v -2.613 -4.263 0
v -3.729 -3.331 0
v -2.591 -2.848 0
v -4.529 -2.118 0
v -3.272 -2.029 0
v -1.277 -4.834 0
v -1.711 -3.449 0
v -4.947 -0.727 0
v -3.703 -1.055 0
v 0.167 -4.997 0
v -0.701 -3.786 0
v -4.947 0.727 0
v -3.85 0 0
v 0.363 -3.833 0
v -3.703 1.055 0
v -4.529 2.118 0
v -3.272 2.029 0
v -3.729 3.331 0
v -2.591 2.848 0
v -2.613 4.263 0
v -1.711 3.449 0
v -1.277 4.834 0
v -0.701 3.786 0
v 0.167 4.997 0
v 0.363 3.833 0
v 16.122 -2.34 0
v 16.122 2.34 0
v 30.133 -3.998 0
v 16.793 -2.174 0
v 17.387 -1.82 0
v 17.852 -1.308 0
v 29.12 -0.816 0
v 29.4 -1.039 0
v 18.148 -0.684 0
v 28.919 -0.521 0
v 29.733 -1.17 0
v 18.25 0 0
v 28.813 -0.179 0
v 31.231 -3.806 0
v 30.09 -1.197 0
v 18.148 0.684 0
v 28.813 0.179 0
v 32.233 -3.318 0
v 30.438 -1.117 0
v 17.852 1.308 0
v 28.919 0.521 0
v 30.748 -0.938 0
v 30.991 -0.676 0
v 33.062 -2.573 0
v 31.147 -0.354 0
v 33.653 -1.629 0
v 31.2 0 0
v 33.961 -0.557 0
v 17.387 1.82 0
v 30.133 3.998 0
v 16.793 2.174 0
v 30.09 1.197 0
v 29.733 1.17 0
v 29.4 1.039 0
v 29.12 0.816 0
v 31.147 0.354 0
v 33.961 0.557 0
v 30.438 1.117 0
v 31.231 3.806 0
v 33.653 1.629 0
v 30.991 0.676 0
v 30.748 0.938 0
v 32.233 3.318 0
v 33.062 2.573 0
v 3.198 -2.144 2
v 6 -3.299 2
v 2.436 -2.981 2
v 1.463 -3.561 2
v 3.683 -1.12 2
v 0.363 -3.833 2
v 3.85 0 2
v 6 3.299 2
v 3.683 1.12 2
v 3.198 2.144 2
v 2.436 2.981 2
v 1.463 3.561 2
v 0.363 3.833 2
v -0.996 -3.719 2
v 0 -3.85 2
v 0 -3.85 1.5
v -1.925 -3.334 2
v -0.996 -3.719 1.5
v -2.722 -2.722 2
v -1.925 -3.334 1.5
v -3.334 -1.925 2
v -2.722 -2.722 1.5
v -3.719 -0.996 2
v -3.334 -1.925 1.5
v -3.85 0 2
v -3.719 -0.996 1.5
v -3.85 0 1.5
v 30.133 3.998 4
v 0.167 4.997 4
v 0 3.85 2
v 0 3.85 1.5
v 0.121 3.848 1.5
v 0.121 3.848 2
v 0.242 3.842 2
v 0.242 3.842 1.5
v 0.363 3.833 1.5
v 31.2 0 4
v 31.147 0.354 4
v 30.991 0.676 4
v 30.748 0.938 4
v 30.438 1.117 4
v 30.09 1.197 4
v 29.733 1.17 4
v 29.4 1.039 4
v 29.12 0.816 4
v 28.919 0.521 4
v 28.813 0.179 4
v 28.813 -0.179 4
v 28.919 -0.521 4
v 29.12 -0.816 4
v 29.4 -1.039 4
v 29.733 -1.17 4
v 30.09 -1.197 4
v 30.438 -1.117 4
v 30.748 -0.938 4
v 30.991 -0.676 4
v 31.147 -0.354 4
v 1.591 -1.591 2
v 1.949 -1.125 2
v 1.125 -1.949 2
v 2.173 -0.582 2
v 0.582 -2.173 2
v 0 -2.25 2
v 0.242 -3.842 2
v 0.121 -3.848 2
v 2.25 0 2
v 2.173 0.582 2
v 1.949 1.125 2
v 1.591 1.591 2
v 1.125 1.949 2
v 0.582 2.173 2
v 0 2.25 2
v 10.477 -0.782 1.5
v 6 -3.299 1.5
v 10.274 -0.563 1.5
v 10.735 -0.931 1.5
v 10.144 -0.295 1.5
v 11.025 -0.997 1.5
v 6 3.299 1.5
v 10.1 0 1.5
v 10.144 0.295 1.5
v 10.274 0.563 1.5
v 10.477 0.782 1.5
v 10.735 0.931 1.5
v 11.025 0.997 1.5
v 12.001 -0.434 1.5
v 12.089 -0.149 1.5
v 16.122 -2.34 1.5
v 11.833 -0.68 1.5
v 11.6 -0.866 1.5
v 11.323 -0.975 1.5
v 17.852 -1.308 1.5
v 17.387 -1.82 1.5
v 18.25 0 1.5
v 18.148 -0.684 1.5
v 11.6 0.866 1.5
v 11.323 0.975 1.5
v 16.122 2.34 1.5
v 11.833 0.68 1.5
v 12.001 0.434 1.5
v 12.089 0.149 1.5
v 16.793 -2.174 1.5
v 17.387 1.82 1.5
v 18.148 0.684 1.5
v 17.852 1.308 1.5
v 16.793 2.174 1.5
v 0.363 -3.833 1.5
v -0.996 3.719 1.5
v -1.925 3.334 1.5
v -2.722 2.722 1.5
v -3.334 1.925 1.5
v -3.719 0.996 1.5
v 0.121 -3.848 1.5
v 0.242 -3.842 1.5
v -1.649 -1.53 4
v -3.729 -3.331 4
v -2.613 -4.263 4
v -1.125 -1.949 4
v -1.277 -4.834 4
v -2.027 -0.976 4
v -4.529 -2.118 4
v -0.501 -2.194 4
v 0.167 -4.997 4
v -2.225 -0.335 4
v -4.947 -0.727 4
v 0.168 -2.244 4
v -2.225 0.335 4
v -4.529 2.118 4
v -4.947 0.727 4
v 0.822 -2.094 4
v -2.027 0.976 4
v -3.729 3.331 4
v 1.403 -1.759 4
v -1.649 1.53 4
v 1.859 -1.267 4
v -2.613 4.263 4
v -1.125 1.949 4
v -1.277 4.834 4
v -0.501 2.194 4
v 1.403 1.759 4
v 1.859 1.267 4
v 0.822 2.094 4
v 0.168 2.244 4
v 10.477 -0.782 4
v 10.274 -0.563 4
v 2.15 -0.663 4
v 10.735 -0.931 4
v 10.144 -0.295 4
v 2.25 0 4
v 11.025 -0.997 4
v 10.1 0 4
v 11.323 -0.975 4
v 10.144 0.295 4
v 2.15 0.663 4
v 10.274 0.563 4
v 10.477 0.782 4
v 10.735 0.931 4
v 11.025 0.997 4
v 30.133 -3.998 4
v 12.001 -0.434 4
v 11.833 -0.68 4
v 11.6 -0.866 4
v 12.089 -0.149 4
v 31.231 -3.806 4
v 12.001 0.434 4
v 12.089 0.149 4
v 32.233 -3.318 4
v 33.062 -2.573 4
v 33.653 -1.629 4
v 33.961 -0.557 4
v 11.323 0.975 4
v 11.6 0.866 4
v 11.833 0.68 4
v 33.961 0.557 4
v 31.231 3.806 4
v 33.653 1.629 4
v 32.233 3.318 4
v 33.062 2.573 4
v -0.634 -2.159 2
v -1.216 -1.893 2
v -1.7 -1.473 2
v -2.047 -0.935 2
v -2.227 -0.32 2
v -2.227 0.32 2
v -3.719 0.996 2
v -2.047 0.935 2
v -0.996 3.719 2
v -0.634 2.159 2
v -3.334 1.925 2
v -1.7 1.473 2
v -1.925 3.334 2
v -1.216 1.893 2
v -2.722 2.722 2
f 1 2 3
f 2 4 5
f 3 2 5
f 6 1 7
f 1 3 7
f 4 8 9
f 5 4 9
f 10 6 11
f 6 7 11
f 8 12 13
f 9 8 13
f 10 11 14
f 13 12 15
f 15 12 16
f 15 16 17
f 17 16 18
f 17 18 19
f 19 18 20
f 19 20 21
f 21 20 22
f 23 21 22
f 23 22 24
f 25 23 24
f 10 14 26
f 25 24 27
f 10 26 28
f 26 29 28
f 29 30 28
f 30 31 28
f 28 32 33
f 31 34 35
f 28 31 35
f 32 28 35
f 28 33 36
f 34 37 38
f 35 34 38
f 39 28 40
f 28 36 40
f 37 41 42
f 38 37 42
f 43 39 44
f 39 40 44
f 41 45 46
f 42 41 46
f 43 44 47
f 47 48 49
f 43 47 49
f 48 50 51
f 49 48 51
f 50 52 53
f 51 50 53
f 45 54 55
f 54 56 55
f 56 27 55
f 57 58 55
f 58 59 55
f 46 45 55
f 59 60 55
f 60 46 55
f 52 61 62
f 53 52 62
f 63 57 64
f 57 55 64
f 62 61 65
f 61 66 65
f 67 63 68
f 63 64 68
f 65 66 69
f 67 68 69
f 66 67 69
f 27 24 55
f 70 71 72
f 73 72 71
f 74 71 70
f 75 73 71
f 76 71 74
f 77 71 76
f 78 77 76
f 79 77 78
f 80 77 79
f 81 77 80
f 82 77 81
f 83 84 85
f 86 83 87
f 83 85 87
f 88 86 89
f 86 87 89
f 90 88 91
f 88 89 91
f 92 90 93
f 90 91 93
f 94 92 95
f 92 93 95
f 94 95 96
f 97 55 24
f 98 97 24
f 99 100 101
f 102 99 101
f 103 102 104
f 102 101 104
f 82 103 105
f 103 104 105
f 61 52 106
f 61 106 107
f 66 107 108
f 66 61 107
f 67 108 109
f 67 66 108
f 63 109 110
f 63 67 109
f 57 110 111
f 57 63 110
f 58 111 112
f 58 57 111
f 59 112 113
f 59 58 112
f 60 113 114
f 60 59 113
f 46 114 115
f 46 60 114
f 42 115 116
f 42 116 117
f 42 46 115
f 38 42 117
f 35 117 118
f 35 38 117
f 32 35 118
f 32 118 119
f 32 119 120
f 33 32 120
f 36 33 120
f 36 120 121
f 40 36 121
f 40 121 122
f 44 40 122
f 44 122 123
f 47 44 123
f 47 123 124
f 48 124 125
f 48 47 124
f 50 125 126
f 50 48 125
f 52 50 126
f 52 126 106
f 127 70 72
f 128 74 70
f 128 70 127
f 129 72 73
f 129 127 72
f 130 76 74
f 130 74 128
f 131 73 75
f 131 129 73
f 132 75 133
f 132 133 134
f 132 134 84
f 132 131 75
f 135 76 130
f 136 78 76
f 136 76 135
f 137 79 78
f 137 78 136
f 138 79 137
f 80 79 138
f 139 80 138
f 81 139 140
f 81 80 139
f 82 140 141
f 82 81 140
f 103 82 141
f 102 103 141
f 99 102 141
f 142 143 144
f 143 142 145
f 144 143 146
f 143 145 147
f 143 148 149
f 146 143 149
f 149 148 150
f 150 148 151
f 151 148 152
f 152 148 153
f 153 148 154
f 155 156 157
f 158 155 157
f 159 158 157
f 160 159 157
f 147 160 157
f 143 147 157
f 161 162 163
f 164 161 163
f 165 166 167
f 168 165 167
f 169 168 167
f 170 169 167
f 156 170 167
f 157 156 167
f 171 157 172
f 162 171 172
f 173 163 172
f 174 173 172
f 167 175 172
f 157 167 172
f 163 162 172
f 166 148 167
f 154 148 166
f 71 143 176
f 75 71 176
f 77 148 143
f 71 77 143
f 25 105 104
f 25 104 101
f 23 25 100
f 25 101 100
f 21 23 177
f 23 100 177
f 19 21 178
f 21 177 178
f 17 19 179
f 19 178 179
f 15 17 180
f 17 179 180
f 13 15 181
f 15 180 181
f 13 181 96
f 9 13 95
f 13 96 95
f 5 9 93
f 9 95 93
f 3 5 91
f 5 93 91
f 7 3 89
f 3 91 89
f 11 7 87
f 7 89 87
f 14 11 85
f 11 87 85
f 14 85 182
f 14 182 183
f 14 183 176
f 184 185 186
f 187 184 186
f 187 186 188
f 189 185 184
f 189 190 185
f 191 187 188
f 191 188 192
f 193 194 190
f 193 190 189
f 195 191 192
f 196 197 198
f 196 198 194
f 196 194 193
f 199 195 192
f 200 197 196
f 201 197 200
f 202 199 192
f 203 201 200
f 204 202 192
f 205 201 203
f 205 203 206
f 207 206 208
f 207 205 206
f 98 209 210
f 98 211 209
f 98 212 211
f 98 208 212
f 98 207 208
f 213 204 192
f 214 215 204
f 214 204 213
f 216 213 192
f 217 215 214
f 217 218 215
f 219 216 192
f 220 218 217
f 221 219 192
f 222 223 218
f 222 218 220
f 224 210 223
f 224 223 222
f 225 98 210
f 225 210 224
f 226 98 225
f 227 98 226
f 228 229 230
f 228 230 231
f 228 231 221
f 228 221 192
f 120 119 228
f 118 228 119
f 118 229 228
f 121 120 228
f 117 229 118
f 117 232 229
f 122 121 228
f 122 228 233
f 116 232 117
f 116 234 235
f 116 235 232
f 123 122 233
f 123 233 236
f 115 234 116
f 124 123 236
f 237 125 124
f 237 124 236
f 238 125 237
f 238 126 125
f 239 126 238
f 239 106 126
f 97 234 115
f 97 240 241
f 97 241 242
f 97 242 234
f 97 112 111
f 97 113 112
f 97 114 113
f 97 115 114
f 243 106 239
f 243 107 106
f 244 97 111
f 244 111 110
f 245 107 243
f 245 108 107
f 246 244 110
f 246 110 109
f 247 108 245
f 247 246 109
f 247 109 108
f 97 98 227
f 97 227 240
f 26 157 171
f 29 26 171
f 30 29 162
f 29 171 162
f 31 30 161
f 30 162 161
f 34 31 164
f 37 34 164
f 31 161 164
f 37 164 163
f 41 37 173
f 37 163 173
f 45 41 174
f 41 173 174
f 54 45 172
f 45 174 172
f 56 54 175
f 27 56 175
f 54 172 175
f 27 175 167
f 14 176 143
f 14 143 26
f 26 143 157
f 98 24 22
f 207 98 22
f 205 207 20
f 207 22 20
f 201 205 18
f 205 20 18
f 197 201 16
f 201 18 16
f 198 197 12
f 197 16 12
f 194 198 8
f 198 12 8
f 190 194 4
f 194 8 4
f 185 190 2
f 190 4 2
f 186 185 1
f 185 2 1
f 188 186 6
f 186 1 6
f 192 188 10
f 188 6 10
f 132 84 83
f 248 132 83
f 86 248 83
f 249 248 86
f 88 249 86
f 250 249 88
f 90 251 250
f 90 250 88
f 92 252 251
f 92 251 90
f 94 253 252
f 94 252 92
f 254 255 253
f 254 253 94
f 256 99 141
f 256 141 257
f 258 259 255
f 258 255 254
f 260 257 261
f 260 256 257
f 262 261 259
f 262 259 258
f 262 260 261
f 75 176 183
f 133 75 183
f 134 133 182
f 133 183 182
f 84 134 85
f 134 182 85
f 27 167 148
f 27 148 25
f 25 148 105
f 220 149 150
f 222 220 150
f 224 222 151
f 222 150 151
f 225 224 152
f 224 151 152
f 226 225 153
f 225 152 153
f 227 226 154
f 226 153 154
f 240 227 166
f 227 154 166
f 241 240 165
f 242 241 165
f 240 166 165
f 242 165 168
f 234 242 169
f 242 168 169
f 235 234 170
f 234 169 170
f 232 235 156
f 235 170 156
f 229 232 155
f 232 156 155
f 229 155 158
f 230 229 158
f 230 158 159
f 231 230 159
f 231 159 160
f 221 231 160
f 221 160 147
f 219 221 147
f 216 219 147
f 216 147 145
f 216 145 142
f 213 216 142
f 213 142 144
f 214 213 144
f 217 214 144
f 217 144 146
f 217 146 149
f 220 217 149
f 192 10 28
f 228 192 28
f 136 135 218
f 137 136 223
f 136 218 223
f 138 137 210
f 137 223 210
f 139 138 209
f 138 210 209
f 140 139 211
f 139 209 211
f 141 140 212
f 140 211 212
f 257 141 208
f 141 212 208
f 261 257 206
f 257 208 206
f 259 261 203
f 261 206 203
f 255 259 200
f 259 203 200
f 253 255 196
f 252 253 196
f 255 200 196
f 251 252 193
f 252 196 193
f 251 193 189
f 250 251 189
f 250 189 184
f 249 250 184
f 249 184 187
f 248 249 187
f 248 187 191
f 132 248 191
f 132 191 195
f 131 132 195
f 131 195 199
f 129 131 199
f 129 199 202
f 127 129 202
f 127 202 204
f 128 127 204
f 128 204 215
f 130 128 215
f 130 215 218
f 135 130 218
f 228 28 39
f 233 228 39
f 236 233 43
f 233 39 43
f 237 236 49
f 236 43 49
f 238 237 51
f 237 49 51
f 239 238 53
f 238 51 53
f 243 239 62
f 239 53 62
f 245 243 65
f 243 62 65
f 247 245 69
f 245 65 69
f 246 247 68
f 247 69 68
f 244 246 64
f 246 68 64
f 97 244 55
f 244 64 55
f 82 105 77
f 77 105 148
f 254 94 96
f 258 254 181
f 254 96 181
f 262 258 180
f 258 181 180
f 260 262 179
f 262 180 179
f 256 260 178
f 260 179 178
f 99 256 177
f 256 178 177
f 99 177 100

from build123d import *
from build123d.topology import SkipClean

# Parameters (mm, degrees)
SKETCH14_R          = 4
SKETCH14_R_2        = 1.2
SKETCH14_R_3        = 5
BOSS_EXTRUDE1_DEPTH = 4
CUT_EXTRUDE1_START  = -2.5
SKETCH15_R          = 1.2
CUT_EXTRUDE1_DEPTH  = 1.5
CUT_EXTRUDE2_DEPTH  = 0.5
SKETCH17_R          = 1
CUT_EXTRUDE3_DEPTH  = 6
SKETCH18_R          = 2.25
CUT_EXTRUDE4_DEPTH  = 10


with BuildPart() as part:
    # Sketch14 → Boss-Extrude1 (new body)
    with BuildSketch(Plane.XY):
        with BuildLine():
            Line((30.133333333, 3.99777716), (0.166666667, 4.99722145))
            ThreePointArc((0.166666667, 4.99722145), (3.593976442, 3.476108936), (5, 0))
            ThreePointArc((5, 0), (3.593976442, -3.476108936), (0.166666667, -4.99722145))
            Line((0.166666667, -4.99722145), (30.133333333, -3.99777716))
            ThreePointArc((30.133333333, -3.99777716), (26, 0), (30.133333333, 3.99777716))
        make_face()
        with Locations((30, 0)):
            Circle(SKETCH14_R)
        with Locations((30, 0)):
            Circle(SKETCH14_R_2, mode=Mode.SUBTRACT)
        Circle(SKETCH14_R_3)
        Circle(SKETCH14_R_2, mode=Mode.SUBTRACT)
    extrude(amount=BOSS_EXTRUDE1_DEPTH)

    # Sketch15 → Cut-Extrude1 (cut)
    with BuildSketch(Plane.XY.offset(4).offset(CUT_EXTRUDE1_START)):
        with BuildLine():
            Line((16.121698113, 2.33951917), (0.363207547, 3.832829278))
            ThreePointArc((0.363207547, 3.832829278), (-3.85, 0), (0.363207547, -3.832829278))
            Line((0.363207547, -3.832829278), (16.121698113, -2.33951917))
            ThreePointArc((16.121698113, -2.33951917), (18.25, 0), (16.121698113, 2.33951917))
        make_face()
        Circle(SKETCH15_R, mode=Mode.SUBTRACT)
    extrude(amount=-CUT_EXTRUDE1_DEPTH, mode=Mode.SUBTRACT)

    # Sketch16 → Cut-Extrude2 (cut)
    with SkipClean():  # the faces are left unmerged after this step: merging them gives an invalid solid
        with BuildSketch(Plane(origin=(0, 0, 1.5), x_dir=(-1, 0, 0), z_dir=(0, 0, -1))):
            with BuildLine():
                ThreePointArc((-0.363207547, -3.832829278), (-3.85, 0), (-0.363207547, 3.832829278))
                Line((-0.363207547, 3.832829278), (-6, 3.298674112))
                Line((-6, 3.298674112), (-6, -3.298674112))
                Line((-6, -3.298674112), (-0.363207547, -3.832829278))
            make_face()
            with BuildLine():
                ThreePointArc((3.85, 0), (2.722361108, 2.722361108), (0, 3.85))
                Line((0, 3.85), (0, 1.2))
                ThreePointArc((0, 1.2), (0.848528137, 0.848528137), (1.2, 0))
                ThreePointArc((1.2, 0), (0.848528137, -0.848528137), (0, -1.2))
                Line((0, -1.2), (0, -3.85))
                ThreePointArc((0, -3.85), (2.722361108, -2.722361108), (3.85, 0))
            make_face()
            with BuildLine():
                Line((0, 1.2), (0, 3.85))
                ThreePointArc((0, 3.85), (-0.181806598, 3.845704924), (-0.363207547, 3.832829278))
                ThreePointArc((-0.363207547, 3.832829278), (-3.85, 0), (-0.363207547, -3.832829278))
                ThreePointArc((-0.363207547, -3.832829278), (-0.181806598, -3.845704924), (0, -3.85))
                Line((0, -3.85), (0, -1.2))
                ThreePointArc((0, -1.2), (-1.2, 0), (0, 1.2))
            make_face()
        extrude(amount=-CUT_EXTRUDE2_DEPTH, mode=Mode.SUBTRACT)

    # Sketch17 → Cut-Extrude3 (cut)
    with SkipClean():  # the faces are left unmerged after this step: merging them gives an invalid solid
        with BuildSketch(Plane(origin=(0, 0, 1.5), x_dir=(-1, 0, 0), z_dir=(0, 0, -1))):
            with Locations((-11.1, 0)):
                Circle(SKETCH17_R)
        extrude(amount=-CUT_EXTRUDE3_DEPTH, mode=Mode.SUBTRACT)

    # Sketch18 → Cut-Extrude4 (cut)
    with SkipClean():  # the faces are left unmerged after this step: merging them gives an invalid solid
        with BuildSketch(Plane.XY.offset(4)):
            Circle(SKETCH18_R)
        extrude(amount=-CUT_EXTRUDE4_DEPTH, mode=Mode.SUBTRACT)


solid = part.part
